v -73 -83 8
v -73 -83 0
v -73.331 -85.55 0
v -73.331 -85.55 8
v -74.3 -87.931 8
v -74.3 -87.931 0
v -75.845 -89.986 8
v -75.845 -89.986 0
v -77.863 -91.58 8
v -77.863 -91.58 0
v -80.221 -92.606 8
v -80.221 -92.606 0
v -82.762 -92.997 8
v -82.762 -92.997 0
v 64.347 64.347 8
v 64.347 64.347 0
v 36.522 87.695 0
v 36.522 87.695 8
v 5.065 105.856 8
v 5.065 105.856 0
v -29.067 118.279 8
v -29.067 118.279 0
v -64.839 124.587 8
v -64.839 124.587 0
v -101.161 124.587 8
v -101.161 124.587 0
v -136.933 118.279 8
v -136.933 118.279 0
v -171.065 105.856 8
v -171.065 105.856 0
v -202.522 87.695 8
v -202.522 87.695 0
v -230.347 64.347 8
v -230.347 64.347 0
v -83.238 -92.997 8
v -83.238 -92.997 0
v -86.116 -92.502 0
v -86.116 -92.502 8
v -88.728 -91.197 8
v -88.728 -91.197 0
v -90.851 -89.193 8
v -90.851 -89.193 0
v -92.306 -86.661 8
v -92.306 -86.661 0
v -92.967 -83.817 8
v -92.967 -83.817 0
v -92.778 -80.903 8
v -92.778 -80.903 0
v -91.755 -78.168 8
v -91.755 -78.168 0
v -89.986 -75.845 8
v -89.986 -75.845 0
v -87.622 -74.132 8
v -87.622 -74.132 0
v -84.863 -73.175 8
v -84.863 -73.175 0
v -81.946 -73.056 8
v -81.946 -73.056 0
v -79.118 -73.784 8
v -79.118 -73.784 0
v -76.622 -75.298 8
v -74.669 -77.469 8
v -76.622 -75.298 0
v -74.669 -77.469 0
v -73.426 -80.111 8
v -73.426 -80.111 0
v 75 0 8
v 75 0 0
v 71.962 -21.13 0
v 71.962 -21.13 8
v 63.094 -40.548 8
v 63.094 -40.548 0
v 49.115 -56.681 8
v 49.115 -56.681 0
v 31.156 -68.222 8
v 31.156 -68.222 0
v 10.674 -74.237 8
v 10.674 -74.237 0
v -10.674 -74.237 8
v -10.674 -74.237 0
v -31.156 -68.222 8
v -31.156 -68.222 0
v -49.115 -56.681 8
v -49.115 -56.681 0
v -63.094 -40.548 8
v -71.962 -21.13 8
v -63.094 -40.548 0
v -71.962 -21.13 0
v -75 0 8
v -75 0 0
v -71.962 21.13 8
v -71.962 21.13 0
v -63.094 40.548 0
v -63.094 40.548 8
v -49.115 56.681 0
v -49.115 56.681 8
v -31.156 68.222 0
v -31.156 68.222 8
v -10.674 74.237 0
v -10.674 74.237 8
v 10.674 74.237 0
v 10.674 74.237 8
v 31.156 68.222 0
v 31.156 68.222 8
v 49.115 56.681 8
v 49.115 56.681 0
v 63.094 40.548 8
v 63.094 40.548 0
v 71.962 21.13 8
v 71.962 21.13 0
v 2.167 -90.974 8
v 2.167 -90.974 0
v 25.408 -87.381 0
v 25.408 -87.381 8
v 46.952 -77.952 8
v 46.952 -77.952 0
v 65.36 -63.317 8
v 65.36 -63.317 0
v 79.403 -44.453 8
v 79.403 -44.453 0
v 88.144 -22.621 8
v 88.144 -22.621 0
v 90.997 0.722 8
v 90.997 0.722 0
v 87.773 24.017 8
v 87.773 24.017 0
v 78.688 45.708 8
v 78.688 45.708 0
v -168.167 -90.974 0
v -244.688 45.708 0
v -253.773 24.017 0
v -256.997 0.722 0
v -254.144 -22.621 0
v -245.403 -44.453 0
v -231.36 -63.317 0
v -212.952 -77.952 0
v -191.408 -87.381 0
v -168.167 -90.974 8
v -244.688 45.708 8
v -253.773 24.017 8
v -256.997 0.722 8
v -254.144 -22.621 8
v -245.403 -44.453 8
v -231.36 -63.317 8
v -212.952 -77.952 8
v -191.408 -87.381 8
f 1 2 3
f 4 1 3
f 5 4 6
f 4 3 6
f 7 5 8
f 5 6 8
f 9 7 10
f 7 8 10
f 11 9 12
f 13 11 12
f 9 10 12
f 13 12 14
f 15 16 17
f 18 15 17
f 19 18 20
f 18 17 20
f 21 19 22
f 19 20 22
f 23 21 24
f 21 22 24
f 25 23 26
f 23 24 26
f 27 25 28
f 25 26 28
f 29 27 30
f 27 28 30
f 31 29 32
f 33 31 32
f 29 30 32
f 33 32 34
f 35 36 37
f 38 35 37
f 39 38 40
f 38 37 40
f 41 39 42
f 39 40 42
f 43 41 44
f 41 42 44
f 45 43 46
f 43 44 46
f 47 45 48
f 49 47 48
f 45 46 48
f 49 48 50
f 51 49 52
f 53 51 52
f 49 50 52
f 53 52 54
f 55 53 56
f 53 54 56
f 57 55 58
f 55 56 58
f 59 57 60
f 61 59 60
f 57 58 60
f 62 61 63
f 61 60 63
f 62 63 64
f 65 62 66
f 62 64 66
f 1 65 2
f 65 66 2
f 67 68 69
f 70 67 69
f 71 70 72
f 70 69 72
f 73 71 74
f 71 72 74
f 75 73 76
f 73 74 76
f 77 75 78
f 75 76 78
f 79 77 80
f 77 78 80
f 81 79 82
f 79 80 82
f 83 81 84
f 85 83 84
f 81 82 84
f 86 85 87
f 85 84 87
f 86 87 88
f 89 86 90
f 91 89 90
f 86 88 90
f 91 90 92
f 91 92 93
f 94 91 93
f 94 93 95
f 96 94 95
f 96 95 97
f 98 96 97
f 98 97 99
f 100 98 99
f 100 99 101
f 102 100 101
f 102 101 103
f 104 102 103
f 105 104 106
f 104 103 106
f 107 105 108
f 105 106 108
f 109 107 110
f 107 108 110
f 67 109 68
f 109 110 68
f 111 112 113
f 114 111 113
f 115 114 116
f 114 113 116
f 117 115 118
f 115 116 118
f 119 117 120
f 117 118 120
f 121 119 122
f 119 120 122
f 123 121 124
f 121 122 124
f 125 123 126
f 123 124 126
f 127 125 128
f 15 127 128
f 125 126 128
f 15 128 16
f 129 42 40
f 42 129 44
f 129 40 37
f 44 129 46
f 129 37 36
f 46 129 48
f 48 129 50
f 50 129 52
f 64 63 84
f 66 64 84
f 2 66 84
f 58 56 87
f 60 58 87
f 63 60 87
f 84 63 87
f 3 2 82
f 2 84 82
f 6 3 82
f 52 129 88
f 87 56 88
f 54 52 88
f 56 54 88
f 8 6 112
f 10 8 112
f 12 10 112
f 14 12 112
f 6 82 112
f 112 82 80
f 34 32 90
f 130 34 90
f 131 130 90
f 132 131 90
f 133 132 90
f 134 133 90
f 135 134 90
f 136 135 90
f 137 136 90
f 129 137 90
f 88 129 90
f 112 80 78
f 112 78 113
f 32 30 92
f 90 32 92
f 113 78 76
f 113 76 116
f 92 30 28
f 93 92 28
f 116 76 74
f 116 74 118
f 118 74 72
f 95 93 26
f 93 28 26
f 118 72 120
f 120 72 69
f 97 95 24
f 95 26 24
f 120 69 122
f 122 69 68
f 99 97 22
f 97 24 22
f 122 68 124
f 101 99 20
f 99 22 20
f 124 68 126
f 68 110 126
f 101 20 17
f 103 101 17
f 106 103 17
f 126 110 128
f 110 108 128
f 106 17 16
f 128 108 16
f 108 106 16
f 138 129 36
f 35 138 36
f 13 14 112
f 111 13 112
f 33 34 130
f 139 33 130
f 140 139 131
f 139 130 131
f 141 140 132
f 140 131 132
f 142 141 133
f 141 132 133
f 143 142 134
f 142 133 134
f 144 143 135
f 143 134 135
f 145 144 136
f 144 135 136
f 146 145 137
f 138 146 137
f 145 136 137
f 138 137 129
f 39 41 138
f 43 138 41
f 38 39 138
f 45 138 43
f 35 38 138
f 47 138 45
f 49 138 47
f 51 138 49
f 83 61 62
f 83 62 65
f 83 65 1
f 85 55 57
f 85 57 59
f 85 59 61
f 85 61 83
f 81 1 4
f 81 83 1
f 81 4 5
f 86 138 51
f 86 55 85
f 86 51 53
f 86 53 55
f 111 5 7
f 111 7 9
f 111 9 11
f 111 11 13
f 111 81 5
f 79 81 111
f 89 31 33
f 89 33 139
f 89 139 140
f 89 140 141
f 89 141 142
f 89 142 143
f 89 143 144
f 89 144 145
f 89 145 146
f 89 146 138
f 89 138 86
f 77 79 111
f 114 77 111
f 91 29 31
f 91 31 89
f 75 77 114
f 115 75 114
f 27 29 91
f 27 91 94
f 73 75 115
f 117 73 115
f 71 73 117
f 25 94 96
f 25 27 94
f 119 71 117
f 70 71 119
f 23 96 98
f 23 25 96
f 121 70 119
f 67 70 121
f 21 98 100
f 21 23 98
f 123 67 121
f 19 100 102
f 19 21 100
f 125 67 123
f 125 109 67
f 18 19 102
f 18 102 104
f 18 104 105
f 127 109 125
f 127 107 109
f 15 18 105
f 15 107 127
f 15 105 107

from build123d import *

# Parameters (mm, degrees)
F0_R     = 75
F1_DEPTH = 8


with BuildPart() as f1:
    # F0 (on Top) → F1 (new body)
    with BuildSketch(Plane.XY):
        with BuildLine():
            ThreePointArc((-168.166967, -90.974196), (-117.487432, -76.990459), (-83, -37.309516))
            ThreePointArc((-83, -37.309516), (-48.512568, -76.990459), (2.166967, -90.974196))
            ThreePointArc((2.166967, -90.974196), (84.481738, -33.820644), (64.346717, 64.346717))
            ThreePointArc((64.346717, 64.346717), (-83, 125.379726), (-230.346717, 64.346717))
            ThreePointArc((-230.346717, 64.346717), (-250.481738, -33.820644), (-168.166967, -90.974196))
        make_face()
        with Locations((-166, 0)):
            Circle(F0_R, mode=Mode.SUBTRACT)
        with BuildLine():
            ThreePointArc((-75, 0), (0, 75), (75, 0))
            ThreePointArc((75, 0), (0, -75), (-75, 0))
        make_face(mode=Mode.SUBTRACT)
        with Locations((-166, 0)):
            Circle(F0_R)
        with BuildLine():
            ThreePointArc((2.166967, -90.974196), (-48.512568, -76.990459), (-83, -37.309516))
            ThreePointArc((-83, -37.309516), (-117.487432, -76.990459), (-168.166967, -90.974196))
            Line((-168.166967, -90.974196), (-83.238128, -92.997164))
            ThreePointArc((-83.238128, -92.997164), (-89.98637, -75.845236), (-73, -83))
            ThreePointArc((-73, -83), (-75.845236, -89.98637), (-82.761872, -92.997164))
            Line((-82.761872, -92.997164), (2.166967, -90.974196))
        make_face()
    extrude(amount=F1_DEPTH)


solid = f1.part
